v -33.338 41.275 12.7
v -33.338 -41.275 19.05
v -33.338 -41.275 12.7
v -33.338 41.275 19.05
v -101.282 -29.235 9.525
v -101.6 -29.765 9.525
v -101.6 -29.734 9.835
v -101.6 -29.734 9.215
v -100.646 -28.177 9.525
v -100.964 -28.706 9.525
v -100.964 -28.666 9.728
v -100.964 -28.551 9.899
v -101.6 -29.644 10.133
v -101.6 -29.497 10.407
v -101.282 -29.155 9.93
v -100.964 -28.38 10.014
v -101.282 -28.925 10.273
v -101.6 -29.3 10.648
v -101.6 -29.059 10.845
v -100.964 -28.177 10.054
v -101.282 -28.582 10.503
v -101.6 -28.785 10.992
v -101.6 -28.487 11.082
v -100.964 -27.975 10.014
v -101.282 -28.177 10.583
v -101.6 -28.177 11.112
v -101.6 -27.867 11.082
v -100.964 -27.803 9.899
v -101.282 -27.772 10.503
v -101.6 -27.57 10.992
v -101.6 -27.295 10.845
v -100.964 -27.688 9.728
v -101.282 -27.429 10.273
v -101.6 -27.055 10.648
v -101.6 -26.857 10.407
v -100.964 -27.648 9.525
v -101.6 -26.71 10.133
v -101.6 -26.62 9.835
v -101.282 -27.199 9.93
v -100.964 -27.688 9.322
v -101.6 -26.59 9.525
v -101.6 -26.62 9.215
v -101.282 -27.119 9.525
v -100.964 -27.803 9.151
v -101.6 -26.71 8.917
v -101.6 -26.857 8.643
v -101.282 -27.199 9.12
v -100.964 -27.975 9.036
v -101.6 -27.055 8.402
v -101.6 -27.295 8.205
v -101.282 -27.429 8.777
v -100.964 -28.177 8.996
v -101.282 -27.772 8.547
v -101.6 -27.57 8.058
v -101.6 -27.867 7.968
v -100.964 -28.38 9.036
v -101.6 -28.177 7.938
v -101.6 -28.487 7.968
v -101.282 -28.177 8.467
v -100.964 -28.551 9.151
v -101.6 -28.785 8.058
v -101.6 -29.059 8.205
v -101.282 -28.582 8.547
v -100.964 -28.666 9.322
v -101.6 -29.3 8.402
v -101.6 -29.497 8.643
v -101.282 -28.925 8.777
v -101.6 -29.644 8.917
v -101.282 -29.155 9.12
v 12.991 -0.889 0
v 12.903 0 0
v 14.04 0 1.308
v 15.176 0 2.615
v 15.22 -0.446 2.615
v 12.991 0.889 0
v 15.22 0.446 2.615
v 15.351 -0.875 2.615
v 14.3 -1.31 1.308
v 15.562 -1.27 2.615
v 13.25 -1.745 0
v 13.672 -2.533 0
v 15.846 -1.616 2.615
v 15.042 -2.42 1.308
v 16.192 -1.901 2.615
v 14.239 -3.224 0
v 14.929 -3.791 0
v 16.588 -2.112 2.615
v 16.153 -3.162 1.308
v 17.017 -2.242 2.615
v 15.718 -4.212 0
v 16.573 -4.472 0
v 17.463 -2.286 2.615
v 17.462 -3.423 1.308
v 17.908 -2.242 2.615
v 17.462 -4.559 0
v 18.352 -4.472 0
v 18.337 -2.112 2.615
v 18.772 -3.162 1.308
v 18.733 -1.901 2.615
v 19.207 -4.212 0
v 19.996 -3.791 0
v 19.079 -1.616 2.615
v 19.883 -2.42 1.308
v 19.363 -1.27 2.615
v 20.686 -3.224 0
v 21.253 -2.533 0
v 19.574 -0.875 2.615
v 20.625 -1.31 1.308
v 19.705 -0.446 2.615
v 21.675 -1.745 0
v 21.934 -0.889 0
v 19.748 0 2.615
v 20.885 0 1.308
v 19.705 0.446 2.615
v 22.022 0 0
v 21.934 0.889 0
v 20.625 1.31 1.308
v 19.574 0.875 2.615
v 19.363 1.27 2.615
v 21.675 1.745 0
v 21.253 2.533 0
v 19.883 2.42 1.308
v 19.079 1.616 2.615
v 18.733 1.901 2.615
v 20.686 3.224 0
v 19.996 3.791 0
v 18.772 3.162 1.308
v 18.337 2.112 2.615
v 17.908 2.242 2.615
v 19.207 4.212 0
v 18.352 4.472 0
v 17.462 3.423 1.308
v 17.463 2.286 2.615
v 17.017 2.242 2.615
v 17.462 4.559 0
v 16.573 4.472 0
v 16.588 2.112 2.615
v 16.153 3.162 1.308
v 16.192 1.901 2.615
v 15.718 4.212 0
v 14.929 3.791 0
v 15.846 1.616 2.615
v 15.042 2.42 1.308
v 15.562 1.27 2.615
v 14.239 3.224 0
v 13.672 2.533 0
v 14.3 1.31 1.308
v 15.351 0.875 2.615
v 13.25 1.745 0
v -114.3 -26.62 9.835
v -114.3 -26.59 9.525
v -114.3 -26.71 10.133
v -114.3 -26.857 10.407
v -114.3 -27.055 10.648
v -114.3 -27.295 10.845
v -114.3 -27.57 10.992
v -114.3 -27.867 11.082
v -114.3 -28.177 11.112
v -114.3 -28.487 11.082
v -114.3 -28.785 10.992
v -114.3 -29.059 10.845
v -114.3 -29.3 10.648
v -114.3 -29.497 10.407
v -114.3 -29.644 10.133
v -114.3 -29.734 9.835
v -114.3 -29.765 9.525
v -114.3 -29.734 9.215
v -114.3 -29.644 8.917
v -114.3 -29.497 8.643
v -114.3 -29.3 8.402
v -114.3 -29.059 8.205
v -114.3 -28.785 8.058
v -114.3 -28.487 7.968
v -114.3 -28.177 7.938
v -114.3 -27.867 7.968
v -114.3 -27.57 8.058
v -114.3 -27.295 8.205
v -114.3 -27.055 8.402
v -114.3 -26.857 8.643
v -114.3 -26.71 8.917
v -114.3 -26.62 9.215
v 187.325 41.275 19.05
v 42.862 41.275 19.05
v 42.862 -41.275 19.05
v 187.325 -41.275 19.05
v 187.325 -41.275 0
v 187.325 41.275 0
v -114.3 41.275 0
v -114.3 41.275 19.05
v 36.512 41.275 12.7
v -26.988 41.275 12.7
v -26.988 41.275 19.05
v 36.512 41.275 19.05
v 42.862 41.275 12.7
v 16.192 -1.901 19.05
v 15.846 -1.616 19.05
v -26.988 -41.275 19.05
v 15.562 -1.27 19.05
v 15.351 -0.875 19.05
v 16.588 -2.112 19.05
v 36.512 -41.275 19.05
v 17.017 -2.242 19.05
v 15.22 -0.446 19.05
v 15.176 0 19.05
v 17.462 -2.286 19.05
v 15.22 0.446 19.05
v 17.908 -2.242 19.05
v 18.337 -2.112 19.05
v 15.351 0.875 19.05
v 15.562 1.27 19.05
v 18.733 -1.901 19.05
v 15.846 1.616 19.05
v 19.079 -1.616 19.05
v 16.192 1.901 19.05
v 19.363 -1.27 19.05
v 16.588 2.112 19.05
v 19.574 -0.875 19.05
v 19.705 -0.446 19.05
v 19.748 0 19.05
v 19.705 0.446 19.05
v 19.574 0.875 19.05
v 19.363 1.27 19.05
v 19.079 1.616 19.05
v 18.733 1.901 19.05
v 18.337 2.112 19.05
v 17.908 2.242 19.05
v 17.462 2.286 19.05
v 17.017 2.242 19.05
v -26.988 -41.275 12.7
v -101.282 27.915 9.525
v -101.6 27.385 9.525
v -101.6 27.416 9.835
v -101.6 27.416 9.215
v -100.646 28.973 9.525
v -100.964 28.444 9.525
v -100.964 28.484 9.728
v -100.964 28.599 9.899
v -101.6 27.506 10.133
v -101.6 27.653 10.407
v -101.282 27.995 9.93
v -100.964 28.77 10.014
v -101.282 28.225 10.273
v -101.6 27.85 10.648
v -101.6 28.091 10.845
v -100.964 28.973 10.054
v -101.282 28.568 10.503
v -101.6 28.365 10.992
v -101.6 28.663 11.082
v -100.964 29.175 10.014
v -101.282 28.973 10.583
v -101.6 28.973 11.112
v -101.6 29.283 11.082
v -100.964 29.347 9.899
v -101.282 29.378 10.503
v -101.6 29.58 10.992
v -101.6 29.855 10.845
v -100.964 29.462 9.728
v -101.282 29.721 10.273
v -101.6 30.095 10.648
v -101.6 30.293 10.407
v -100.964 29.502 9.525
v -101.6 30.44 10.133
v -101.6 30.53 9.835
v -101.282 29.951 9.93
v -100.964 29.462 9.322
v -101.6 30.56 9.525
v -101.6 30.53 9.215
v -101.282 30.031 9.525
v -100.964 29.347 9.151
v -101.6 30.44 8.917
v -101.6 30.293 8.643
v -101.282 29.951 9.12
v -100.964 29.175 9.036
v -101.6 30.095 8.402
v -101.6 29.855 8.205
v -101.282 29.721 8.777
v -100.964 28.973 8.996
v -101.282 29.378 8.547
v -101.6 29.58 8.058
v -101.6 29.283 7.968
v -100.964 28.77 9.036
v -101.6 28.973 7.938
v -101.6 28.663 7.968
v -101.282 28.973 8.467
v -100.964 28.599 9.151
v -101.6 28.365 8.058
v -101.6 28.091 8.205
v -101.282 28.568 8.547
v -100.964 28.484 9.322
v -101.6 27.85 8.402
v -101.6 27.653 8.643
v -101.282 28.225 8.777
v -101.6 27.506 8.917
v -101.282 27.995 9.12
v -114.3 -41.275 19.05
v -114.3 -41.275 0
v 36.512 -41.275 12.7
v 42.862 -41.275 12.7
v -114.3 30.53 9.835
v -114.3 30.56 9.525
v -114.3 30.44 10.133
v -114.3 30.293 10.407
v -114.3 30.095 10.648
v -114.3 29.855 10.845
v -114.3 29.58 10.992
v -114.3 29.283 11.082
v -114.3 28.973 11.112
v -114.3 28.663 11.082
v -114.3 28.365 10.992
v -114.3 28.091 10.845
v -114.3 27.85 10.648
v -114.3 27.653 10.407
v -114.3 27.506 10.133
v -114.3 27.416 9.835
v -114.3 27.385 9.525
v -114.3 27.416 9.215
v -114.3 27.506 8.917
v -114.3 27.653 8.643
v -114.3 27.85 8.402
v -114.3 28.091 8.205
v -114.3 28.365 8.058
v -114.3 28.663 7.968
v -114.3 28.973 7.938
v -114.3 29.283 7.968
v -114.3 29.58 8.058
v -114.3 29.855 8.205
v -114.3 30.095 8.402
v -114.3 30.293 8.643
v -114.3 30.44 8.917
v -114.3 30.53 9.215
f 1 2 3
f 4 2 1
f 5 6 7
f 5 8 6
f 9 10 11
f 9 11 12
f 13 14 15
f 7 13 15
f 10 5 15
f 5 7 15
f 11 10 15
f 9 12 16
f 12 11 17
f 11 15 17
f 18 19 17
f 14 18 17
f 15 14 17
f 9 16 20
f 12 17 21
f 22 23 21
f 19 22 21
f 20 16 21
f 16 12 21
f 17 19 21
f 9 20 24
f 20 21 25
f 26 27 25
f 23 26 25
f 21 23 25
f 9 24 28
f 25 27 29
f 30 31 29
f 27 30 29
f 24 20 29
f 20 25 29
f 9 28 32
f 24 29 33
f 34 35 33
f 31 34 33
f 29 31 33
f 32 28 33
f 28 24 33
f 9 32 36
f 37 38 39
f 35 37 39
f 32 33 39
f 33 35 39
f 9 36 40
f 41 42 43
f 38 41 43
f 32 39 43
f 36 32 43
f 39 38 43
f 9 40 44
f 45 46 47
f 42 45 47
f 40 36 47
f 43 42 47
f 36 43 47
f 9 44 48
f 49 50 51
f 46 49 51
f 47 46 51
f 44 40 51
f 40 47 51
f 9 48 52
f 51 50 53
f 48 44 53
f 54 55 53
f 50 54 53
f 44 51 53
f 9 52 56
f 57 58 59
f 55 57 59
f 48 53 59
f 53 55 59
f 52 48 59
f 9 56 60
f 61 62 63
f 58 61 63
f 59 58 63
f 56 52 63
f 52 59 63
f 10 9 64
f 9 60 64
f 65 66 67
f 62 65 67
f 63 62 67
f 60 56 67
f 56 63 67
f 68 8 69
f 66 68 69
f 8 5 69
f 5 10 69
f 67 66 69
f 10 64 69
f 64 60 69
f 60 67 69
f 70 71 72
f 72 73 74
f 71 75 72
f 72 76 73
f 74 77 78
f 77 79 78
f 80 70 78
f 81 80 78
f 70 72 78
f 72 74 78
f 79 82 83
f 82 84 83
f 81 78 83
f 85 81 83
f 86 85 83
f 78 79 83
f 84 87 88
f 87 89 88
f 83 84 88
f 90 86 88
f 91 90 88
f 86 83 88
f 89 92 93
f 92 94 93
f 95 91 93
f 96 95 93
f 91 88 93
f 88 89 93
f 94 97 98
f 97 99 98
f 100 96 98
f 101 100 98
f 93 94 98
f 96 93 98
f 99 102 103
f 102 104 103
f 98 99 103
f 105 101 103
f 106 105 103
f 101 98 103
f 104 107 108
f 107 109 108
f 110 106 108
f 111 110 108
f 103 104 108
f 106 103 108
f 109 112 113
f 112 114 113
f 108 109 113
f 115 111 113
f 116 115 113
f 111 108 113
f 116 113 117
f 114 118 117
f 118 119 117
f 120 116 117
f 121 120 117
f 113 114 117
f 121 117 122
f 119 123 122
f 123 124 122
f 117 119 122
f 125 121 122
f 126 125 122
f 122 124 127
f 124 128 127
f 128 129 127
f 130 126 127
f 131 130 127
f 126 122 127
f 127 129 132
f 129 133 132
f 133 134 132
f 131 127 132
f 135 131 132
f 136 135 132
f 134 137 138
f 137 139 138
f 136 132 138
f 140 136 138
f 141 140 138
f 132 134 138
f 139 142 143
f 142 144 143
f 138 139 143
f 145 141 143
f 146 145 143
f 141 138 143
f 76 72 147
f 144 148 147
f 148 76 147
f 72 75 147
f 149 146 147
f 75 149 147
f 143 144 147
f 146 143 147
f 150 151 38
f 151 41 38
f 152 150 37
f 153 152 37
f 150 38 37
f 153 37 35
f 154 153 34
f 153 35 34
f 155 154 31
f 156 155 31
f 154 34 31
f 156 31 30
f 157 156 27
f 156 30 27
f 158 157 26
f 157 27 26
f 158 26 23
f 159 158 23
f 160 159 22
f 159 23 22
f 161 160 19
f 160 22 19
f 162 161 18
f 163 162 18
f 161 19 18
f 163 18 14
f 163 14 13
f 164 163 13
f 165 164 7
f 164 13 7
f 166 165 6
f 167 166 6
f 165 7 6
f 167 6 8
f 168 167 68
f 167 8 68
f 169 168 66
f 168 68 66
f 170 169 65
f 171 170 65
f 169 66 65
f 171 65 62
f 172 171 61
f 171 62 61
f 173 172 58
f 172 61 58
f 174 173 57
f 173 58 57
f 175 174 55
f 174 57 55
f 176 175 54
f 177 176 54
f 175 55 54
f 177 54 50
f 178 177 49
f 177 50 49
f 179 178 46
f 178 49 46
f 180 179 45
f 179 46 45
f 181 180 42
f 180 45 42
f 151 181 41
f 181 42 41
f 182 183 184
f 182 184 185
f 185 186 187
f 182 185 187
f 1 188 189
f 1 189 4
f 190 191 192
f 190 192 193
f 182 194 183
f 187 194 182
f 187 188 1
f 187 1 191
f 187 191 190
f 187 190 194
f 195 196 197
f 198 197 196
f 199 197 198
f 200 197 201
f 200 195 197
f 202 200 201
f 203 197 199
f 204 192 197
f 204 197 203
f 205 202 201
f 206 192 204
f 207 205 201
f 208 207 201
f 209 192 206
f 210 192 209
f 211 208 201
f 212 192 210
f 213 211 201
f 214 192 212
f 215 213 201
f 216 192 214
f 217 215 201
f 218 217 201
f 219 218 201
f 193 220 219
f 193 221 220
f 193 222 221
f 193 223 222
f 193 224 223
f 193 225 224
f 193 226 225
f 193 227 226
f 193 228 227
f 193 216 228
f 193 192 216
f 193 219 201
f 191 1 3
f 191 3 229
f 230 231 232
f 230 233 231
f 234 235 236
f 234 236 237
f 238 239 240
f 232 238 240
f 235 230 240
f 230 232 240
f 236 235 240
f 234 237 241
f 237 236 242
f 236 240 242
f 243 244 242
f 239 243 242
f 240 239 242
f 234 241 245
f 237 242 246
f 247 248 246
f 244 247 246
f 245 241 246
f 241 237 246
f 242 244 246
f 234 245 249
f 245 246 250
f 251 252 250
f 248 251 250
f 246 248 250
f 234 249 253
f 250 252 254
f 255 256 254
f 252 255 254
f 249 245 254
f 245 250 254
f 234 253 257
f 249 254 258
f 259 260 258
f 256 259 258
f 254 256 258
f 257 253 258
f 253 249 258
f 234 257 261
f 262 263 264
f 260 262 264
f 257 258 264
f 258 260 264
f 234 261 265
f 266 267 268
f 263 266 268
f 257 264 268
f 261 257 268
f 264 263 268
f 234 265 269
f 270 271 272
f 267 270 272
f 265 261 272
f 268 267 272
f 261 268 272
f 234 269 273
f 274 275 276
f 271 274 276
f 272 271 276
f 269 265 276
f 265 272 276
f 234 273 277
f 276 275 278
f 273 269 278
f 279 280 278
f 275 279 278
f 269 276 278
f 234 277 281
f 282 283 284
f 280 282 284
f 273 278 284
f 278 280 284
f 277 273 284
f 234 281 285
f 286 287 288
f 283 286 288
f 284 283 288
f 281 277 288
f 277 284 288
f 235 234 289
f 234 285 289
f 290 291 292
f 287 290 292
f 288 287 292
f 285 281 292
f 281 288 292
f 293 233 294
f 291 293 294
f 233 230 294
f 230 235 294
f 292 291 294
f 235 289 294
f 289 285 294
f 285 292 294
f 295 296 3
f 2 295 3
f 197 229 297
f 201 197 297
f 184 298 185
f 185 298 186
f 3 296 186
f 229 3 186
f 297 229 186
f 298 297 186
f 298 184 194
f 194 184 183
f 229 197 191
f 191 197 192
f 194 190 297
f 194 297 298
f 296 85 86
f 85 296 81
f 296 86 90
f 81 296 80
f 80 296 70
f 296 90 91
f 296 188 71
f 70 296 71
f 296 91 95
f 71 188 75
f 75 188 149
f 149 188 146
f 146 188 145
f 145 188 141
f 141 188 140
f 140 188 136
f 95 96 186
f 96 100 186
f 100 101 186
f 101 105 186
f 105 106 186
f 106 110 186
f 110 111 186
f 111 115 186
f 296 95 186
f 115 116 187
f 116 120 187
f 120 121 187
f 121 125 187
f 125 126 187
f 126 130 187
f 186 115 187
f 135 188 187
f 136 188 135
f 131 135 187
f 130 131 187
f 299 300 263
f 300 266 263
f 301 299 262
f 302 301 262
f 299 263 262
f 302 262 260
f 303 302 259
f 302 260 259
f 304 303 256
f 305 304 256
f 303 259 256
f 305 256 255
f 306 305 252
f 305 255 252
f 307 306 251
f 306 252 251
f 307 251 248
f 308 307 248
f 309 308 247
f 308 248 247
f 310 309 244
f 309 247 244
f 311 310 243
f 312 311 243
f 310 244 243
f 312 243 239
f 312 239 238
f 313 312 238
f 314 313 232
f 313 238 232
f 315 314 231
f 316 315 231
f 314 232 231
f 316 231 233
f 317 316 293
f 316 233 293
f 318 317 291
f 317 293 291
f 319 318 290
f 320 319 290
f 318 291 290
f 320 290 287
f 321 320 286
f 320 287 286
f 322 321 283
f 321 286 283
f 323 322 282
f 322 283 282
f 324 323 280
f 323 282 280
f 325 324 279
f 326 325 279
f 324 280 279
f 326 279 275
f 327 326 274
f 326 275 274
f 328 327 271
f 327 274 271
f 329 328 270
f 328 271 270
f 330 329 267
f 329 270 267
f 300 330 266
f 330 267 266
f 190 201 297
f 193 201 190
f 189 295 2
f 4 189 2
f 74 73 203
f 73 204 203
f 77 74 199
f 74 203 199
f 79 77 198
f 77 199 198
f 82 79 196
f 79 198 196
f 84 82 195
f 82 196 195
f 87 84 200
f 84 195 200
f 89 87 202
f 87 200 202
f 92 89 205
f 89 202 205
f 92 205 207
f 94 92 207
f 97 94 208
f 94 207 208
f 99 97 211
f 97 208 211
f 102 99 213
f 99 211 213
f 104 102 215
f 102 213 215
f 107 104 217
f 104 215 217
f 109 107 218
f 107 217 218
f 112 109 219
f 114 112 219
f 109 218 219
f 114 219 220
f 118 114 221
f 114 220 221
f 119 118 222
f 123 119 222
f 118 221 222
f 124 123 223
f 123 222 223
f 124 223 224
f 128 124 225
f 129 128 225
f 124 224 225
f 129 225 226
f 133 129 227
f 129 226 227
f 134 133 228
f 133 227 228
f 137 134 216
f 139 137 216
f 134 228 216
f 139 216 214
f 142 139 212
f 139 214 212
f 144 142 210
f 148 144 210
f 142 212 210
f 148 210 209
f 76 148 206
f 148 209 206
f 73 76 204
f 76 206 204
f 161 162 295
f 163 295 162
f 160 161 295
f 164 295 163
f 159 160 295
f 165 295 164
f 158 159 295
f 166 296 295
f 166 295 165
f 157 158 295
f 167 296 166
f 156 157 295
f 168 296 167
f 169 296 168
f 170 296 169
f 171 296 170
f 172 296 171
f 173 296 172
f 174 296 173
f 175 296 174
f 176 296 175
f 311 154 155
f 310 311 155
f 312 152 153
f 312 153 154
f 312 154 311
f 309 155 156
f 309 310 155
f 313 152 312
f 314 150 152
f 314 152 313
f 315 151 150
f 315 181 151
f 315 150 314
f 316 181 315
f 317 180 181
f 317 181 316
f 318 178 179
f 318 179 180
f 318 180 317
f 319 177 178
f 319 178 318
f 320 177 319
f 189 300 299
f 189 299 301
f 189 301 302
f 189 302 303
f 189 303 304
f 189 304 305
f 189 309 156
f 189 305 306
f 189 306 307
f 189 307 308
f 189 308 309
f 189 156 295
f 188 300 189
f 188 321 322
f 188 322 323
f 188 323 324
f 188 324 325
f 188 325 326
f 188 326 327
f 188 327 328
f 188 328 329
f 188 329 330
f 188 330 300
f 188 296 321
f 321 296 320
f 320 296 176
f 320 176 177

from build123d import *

# Parameters (mm, degrees)
F0_W           = 301.625
F0_H           = 82.55
F1_DEPTH       = 19.05
F2_W           = 6.35
F2_H           = 82.55
F3_DEPTH       = 6.35
F5_D           = 4.572
F5_CSINK_D     = 9.1186
F5_CSINK_ANGLE = 82
F7_D           = 3.175
F7_DEPTH       = 12.7
F7_TIP         = 0.9538662327


with BuildPart() as f1:
    # F0 (on Top) → F1 (new body)
    with BuildSketch(Plane.XY):
        with Locations((36.5125, 0)):
            Rectangle(F0_W, F0_H)
    extrude(amount=F1_DEPTH)

    # F2 (on face) → F3 (cut)
    with BuildSketch(Plane.XY.offset(19.05)):
        with Locations((-30.1625, 0)):
            Rectangle(F2_W, F2_H)
        with Locations((39.6875, 0)):
            Rectangle(F2_W, F2_H)
    extrude(amount=-F3_DEPTH, mode=Mode.SUBTRACT)

    # F5 (through all)
    with Locations(Plane(origin=(0, 0, 0), x_dir=(1, 0, 0), z_dir=(0, 0, -1))):
        with Locations((17.4625, 0)):
            CounterSinkHole(F5_D / 2, F5_CSINK_D / 2, counter_sink_angle=F5_CSINK_ANGLE)

    # F7
    with Locations(Plane(origin=(-114.3, 0, 0), x_dir=(0, -1, 0), z_dir=(-1, 0, 0))):
        with Locations((-28.9729410976, 9.525), (28.1770589024, 9.525)):
            Hole(F7_D / 2, depth=F7_DEPTH)
            with Locations((0, 0, -(F7_DEPTH + F7_TIP / 2))):  # 118° drill point
                Cone(0, F7_D / 2, F7_TIP, mode=Mode.SUBTRACT)


solid = f1.part
